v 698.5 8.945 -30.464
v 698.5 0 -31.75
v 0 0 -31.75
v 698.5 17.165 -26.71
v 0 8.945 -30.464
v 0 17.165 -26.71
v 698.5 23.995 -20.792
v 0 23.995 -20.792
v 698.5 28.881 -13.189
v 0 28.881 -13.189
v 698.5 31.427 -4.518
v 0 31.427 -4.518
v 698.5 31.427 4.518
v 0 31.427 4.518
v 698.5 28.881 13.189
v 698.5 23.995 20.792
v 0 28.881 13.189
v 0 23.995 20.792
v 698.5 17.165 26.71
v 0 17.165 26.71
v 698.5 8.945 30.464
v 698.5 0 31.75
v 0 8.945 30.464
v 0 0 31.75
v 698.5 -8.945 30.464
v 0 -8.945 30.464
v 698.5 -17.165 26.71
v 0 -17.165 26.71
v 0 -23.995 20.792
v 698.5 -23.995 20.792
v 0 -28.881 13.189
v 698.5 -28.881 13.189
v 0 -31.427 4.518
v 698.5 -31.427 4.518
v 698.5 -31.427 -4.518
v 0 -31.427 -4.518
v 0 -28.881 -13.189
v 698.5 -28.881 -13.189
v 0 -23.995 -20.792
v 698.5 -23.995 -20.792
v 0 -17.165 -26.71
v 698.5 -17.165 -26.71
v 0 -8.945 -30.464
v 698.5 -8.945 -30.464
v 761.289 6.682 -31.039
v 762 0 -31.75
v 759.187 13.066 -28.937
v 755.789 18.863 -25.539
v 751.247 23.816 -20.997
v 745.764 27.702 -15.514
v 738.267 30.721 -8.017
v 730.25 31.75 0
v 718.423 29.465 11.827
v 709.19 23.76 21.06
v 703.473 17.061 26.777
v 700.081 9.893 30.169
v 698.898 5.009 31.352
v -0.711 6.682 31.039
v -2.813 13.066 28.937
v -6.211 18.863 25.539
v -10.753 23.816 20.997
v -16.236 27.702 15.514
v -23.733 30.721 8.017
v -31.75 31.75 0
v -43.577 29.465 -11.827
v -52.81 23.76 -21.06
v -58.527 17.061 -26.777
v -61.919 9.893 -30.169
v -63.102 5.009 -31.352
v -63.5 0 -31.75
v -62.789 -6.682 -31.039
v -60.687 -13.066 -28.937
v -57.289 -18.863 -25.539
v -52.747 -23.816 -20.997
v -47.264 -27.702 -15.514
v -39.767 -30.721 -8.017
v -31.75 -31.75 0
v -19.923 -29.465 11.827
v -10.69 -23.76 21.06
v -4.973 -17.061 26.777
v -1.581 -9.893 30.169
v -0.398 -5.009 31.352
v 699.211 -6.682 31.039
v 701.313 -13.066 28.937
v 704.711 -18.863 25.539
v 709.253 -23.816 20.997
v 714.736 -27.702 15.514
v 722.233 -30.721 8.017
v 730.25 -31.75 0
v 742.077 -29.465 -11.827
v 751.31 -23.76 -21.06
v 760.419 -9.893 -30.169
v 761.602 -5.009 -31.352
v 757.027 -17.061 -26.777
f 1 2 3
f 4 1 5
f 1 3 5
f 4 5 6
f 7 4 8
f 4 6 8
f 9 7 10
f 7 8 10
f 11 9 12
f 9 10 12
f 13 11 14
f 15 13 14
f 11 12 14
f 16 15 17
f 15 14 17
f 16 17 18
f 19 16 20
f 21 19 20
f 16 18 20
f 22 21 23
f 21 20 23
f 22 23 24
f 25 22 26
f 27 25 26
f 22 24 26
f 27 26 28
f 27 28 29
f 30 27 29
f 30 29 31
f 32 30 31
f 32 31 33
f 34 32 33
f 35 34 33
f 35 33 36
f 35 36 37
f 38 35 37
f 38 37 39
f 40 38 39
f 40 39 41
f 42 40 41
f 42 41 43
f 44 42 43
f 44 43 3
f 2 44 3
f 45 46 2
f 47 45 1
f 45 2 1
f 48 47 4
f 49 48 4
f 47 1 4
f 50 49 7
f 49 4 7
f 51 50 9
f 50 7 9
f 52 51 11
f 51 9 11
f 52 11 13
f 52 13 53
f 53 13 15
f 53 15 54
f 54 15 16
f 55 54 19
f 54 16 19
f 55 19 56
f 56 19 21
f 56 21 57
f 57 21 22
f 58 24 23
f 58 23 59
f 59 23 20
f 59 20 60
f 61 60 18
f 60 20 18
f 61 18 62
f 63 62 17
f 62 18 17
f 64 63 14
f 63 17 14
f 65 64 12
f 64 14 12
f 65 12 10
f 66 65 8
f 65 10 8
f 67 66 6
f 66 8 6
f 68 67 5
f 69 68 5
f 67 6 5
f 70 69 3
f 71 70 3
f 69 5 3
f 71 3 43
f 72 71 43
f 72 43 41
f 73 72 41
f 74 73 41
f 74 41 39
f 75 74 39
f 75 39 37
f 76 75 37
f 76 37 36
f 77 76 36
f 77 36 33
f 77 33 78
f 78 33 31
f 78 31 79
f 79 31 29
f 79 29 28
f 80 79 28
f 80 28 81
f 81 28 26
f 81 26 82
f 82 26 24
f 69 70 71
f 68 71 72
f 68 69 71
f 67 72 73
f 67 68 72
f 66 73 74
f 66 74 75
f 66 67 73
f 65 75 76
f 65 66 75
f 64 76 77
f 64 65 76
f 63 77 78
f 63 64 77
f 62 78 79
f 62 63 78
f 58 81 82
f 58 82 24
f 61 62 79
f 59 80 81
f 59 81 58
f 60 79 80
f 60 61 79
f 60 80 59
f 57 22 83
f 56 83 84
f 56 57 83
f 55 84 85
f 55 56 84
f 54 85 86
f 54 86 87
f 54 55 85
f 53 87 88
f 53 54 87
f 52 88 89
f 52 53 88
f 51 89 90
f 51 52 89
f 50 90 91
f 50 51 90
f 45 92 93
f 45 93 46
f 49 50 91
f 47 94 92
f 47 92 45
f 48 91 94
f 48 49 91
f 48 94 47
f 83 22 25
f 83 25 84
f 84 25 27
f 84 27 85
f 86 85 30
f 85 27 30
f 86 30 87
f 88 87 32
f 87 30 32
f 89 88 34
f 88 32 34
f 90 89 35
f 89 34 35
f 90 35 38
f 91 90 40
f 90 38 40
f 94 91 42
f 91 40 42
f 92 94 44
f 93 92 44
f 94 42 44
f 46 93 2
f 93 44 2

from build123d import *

# Parameters (mm, degrees)
SKETCH1_R           = 31.75
BOSS_EXTRUDE1_DEPTH = 698.5
SKETCH5_R           = 31.75
BOSS_EXTRUDE2_DEPTH = 63.5
SKETCH6_R           = 31.75
BOSS_EXTRUDE3_DEPTH = 63.5
CUT_EXTRUDE1_DEPTH  = 63.5


with BuildPart() as part:
    # Sketch1 → Boss-Extrude1 (new body)
    with BuildSketch(Plane(origin=(0, 0, 0), x_dir=(0, 0, -1), z_dir=(1, 0, 0))):
        Circle(SKETCH1_R)
    extrude(amount=BOSS_EXTRUDE1_DEPTH)

    # Sketch5 → Boss-Extrude2 (add)
    with BuildSketch(Plane.ZY):
        Circle(SKETCH5_R)
    extrude(amount=BOSS_EXTRUDE2_DEPTH)

    # Sketch6 → Boss-Extrude3 (add)
    with BuildSketch(Plane(origin=(698.5, 0, 0), x_dir=(0, 0, -1), z_dir=(1, 0, 0))):
        Circle(SKETCH6_R)
    extrude(amount=BOSS_EXTRUDE3_DEPTH)

    # Sketch7 → Cut-Extrude1 (cut)
    with BuildSketch(Plane(origin=(0, 31.75, 0), x_dir=(1, 0, 0), z_dir=(0, 1, 0))):
        Polygon((0, -31.75), (-63.5, -31.75), (-63.5, 31.75), align=None)
        Polygon((698.5, -31.75), (762, 31.75), (762, -31.75), align=None)
    extrude(amount=-CUT_EXTRUDE1_DEPTH, mode=Mode.SUBTRACT)


solid = part.part
